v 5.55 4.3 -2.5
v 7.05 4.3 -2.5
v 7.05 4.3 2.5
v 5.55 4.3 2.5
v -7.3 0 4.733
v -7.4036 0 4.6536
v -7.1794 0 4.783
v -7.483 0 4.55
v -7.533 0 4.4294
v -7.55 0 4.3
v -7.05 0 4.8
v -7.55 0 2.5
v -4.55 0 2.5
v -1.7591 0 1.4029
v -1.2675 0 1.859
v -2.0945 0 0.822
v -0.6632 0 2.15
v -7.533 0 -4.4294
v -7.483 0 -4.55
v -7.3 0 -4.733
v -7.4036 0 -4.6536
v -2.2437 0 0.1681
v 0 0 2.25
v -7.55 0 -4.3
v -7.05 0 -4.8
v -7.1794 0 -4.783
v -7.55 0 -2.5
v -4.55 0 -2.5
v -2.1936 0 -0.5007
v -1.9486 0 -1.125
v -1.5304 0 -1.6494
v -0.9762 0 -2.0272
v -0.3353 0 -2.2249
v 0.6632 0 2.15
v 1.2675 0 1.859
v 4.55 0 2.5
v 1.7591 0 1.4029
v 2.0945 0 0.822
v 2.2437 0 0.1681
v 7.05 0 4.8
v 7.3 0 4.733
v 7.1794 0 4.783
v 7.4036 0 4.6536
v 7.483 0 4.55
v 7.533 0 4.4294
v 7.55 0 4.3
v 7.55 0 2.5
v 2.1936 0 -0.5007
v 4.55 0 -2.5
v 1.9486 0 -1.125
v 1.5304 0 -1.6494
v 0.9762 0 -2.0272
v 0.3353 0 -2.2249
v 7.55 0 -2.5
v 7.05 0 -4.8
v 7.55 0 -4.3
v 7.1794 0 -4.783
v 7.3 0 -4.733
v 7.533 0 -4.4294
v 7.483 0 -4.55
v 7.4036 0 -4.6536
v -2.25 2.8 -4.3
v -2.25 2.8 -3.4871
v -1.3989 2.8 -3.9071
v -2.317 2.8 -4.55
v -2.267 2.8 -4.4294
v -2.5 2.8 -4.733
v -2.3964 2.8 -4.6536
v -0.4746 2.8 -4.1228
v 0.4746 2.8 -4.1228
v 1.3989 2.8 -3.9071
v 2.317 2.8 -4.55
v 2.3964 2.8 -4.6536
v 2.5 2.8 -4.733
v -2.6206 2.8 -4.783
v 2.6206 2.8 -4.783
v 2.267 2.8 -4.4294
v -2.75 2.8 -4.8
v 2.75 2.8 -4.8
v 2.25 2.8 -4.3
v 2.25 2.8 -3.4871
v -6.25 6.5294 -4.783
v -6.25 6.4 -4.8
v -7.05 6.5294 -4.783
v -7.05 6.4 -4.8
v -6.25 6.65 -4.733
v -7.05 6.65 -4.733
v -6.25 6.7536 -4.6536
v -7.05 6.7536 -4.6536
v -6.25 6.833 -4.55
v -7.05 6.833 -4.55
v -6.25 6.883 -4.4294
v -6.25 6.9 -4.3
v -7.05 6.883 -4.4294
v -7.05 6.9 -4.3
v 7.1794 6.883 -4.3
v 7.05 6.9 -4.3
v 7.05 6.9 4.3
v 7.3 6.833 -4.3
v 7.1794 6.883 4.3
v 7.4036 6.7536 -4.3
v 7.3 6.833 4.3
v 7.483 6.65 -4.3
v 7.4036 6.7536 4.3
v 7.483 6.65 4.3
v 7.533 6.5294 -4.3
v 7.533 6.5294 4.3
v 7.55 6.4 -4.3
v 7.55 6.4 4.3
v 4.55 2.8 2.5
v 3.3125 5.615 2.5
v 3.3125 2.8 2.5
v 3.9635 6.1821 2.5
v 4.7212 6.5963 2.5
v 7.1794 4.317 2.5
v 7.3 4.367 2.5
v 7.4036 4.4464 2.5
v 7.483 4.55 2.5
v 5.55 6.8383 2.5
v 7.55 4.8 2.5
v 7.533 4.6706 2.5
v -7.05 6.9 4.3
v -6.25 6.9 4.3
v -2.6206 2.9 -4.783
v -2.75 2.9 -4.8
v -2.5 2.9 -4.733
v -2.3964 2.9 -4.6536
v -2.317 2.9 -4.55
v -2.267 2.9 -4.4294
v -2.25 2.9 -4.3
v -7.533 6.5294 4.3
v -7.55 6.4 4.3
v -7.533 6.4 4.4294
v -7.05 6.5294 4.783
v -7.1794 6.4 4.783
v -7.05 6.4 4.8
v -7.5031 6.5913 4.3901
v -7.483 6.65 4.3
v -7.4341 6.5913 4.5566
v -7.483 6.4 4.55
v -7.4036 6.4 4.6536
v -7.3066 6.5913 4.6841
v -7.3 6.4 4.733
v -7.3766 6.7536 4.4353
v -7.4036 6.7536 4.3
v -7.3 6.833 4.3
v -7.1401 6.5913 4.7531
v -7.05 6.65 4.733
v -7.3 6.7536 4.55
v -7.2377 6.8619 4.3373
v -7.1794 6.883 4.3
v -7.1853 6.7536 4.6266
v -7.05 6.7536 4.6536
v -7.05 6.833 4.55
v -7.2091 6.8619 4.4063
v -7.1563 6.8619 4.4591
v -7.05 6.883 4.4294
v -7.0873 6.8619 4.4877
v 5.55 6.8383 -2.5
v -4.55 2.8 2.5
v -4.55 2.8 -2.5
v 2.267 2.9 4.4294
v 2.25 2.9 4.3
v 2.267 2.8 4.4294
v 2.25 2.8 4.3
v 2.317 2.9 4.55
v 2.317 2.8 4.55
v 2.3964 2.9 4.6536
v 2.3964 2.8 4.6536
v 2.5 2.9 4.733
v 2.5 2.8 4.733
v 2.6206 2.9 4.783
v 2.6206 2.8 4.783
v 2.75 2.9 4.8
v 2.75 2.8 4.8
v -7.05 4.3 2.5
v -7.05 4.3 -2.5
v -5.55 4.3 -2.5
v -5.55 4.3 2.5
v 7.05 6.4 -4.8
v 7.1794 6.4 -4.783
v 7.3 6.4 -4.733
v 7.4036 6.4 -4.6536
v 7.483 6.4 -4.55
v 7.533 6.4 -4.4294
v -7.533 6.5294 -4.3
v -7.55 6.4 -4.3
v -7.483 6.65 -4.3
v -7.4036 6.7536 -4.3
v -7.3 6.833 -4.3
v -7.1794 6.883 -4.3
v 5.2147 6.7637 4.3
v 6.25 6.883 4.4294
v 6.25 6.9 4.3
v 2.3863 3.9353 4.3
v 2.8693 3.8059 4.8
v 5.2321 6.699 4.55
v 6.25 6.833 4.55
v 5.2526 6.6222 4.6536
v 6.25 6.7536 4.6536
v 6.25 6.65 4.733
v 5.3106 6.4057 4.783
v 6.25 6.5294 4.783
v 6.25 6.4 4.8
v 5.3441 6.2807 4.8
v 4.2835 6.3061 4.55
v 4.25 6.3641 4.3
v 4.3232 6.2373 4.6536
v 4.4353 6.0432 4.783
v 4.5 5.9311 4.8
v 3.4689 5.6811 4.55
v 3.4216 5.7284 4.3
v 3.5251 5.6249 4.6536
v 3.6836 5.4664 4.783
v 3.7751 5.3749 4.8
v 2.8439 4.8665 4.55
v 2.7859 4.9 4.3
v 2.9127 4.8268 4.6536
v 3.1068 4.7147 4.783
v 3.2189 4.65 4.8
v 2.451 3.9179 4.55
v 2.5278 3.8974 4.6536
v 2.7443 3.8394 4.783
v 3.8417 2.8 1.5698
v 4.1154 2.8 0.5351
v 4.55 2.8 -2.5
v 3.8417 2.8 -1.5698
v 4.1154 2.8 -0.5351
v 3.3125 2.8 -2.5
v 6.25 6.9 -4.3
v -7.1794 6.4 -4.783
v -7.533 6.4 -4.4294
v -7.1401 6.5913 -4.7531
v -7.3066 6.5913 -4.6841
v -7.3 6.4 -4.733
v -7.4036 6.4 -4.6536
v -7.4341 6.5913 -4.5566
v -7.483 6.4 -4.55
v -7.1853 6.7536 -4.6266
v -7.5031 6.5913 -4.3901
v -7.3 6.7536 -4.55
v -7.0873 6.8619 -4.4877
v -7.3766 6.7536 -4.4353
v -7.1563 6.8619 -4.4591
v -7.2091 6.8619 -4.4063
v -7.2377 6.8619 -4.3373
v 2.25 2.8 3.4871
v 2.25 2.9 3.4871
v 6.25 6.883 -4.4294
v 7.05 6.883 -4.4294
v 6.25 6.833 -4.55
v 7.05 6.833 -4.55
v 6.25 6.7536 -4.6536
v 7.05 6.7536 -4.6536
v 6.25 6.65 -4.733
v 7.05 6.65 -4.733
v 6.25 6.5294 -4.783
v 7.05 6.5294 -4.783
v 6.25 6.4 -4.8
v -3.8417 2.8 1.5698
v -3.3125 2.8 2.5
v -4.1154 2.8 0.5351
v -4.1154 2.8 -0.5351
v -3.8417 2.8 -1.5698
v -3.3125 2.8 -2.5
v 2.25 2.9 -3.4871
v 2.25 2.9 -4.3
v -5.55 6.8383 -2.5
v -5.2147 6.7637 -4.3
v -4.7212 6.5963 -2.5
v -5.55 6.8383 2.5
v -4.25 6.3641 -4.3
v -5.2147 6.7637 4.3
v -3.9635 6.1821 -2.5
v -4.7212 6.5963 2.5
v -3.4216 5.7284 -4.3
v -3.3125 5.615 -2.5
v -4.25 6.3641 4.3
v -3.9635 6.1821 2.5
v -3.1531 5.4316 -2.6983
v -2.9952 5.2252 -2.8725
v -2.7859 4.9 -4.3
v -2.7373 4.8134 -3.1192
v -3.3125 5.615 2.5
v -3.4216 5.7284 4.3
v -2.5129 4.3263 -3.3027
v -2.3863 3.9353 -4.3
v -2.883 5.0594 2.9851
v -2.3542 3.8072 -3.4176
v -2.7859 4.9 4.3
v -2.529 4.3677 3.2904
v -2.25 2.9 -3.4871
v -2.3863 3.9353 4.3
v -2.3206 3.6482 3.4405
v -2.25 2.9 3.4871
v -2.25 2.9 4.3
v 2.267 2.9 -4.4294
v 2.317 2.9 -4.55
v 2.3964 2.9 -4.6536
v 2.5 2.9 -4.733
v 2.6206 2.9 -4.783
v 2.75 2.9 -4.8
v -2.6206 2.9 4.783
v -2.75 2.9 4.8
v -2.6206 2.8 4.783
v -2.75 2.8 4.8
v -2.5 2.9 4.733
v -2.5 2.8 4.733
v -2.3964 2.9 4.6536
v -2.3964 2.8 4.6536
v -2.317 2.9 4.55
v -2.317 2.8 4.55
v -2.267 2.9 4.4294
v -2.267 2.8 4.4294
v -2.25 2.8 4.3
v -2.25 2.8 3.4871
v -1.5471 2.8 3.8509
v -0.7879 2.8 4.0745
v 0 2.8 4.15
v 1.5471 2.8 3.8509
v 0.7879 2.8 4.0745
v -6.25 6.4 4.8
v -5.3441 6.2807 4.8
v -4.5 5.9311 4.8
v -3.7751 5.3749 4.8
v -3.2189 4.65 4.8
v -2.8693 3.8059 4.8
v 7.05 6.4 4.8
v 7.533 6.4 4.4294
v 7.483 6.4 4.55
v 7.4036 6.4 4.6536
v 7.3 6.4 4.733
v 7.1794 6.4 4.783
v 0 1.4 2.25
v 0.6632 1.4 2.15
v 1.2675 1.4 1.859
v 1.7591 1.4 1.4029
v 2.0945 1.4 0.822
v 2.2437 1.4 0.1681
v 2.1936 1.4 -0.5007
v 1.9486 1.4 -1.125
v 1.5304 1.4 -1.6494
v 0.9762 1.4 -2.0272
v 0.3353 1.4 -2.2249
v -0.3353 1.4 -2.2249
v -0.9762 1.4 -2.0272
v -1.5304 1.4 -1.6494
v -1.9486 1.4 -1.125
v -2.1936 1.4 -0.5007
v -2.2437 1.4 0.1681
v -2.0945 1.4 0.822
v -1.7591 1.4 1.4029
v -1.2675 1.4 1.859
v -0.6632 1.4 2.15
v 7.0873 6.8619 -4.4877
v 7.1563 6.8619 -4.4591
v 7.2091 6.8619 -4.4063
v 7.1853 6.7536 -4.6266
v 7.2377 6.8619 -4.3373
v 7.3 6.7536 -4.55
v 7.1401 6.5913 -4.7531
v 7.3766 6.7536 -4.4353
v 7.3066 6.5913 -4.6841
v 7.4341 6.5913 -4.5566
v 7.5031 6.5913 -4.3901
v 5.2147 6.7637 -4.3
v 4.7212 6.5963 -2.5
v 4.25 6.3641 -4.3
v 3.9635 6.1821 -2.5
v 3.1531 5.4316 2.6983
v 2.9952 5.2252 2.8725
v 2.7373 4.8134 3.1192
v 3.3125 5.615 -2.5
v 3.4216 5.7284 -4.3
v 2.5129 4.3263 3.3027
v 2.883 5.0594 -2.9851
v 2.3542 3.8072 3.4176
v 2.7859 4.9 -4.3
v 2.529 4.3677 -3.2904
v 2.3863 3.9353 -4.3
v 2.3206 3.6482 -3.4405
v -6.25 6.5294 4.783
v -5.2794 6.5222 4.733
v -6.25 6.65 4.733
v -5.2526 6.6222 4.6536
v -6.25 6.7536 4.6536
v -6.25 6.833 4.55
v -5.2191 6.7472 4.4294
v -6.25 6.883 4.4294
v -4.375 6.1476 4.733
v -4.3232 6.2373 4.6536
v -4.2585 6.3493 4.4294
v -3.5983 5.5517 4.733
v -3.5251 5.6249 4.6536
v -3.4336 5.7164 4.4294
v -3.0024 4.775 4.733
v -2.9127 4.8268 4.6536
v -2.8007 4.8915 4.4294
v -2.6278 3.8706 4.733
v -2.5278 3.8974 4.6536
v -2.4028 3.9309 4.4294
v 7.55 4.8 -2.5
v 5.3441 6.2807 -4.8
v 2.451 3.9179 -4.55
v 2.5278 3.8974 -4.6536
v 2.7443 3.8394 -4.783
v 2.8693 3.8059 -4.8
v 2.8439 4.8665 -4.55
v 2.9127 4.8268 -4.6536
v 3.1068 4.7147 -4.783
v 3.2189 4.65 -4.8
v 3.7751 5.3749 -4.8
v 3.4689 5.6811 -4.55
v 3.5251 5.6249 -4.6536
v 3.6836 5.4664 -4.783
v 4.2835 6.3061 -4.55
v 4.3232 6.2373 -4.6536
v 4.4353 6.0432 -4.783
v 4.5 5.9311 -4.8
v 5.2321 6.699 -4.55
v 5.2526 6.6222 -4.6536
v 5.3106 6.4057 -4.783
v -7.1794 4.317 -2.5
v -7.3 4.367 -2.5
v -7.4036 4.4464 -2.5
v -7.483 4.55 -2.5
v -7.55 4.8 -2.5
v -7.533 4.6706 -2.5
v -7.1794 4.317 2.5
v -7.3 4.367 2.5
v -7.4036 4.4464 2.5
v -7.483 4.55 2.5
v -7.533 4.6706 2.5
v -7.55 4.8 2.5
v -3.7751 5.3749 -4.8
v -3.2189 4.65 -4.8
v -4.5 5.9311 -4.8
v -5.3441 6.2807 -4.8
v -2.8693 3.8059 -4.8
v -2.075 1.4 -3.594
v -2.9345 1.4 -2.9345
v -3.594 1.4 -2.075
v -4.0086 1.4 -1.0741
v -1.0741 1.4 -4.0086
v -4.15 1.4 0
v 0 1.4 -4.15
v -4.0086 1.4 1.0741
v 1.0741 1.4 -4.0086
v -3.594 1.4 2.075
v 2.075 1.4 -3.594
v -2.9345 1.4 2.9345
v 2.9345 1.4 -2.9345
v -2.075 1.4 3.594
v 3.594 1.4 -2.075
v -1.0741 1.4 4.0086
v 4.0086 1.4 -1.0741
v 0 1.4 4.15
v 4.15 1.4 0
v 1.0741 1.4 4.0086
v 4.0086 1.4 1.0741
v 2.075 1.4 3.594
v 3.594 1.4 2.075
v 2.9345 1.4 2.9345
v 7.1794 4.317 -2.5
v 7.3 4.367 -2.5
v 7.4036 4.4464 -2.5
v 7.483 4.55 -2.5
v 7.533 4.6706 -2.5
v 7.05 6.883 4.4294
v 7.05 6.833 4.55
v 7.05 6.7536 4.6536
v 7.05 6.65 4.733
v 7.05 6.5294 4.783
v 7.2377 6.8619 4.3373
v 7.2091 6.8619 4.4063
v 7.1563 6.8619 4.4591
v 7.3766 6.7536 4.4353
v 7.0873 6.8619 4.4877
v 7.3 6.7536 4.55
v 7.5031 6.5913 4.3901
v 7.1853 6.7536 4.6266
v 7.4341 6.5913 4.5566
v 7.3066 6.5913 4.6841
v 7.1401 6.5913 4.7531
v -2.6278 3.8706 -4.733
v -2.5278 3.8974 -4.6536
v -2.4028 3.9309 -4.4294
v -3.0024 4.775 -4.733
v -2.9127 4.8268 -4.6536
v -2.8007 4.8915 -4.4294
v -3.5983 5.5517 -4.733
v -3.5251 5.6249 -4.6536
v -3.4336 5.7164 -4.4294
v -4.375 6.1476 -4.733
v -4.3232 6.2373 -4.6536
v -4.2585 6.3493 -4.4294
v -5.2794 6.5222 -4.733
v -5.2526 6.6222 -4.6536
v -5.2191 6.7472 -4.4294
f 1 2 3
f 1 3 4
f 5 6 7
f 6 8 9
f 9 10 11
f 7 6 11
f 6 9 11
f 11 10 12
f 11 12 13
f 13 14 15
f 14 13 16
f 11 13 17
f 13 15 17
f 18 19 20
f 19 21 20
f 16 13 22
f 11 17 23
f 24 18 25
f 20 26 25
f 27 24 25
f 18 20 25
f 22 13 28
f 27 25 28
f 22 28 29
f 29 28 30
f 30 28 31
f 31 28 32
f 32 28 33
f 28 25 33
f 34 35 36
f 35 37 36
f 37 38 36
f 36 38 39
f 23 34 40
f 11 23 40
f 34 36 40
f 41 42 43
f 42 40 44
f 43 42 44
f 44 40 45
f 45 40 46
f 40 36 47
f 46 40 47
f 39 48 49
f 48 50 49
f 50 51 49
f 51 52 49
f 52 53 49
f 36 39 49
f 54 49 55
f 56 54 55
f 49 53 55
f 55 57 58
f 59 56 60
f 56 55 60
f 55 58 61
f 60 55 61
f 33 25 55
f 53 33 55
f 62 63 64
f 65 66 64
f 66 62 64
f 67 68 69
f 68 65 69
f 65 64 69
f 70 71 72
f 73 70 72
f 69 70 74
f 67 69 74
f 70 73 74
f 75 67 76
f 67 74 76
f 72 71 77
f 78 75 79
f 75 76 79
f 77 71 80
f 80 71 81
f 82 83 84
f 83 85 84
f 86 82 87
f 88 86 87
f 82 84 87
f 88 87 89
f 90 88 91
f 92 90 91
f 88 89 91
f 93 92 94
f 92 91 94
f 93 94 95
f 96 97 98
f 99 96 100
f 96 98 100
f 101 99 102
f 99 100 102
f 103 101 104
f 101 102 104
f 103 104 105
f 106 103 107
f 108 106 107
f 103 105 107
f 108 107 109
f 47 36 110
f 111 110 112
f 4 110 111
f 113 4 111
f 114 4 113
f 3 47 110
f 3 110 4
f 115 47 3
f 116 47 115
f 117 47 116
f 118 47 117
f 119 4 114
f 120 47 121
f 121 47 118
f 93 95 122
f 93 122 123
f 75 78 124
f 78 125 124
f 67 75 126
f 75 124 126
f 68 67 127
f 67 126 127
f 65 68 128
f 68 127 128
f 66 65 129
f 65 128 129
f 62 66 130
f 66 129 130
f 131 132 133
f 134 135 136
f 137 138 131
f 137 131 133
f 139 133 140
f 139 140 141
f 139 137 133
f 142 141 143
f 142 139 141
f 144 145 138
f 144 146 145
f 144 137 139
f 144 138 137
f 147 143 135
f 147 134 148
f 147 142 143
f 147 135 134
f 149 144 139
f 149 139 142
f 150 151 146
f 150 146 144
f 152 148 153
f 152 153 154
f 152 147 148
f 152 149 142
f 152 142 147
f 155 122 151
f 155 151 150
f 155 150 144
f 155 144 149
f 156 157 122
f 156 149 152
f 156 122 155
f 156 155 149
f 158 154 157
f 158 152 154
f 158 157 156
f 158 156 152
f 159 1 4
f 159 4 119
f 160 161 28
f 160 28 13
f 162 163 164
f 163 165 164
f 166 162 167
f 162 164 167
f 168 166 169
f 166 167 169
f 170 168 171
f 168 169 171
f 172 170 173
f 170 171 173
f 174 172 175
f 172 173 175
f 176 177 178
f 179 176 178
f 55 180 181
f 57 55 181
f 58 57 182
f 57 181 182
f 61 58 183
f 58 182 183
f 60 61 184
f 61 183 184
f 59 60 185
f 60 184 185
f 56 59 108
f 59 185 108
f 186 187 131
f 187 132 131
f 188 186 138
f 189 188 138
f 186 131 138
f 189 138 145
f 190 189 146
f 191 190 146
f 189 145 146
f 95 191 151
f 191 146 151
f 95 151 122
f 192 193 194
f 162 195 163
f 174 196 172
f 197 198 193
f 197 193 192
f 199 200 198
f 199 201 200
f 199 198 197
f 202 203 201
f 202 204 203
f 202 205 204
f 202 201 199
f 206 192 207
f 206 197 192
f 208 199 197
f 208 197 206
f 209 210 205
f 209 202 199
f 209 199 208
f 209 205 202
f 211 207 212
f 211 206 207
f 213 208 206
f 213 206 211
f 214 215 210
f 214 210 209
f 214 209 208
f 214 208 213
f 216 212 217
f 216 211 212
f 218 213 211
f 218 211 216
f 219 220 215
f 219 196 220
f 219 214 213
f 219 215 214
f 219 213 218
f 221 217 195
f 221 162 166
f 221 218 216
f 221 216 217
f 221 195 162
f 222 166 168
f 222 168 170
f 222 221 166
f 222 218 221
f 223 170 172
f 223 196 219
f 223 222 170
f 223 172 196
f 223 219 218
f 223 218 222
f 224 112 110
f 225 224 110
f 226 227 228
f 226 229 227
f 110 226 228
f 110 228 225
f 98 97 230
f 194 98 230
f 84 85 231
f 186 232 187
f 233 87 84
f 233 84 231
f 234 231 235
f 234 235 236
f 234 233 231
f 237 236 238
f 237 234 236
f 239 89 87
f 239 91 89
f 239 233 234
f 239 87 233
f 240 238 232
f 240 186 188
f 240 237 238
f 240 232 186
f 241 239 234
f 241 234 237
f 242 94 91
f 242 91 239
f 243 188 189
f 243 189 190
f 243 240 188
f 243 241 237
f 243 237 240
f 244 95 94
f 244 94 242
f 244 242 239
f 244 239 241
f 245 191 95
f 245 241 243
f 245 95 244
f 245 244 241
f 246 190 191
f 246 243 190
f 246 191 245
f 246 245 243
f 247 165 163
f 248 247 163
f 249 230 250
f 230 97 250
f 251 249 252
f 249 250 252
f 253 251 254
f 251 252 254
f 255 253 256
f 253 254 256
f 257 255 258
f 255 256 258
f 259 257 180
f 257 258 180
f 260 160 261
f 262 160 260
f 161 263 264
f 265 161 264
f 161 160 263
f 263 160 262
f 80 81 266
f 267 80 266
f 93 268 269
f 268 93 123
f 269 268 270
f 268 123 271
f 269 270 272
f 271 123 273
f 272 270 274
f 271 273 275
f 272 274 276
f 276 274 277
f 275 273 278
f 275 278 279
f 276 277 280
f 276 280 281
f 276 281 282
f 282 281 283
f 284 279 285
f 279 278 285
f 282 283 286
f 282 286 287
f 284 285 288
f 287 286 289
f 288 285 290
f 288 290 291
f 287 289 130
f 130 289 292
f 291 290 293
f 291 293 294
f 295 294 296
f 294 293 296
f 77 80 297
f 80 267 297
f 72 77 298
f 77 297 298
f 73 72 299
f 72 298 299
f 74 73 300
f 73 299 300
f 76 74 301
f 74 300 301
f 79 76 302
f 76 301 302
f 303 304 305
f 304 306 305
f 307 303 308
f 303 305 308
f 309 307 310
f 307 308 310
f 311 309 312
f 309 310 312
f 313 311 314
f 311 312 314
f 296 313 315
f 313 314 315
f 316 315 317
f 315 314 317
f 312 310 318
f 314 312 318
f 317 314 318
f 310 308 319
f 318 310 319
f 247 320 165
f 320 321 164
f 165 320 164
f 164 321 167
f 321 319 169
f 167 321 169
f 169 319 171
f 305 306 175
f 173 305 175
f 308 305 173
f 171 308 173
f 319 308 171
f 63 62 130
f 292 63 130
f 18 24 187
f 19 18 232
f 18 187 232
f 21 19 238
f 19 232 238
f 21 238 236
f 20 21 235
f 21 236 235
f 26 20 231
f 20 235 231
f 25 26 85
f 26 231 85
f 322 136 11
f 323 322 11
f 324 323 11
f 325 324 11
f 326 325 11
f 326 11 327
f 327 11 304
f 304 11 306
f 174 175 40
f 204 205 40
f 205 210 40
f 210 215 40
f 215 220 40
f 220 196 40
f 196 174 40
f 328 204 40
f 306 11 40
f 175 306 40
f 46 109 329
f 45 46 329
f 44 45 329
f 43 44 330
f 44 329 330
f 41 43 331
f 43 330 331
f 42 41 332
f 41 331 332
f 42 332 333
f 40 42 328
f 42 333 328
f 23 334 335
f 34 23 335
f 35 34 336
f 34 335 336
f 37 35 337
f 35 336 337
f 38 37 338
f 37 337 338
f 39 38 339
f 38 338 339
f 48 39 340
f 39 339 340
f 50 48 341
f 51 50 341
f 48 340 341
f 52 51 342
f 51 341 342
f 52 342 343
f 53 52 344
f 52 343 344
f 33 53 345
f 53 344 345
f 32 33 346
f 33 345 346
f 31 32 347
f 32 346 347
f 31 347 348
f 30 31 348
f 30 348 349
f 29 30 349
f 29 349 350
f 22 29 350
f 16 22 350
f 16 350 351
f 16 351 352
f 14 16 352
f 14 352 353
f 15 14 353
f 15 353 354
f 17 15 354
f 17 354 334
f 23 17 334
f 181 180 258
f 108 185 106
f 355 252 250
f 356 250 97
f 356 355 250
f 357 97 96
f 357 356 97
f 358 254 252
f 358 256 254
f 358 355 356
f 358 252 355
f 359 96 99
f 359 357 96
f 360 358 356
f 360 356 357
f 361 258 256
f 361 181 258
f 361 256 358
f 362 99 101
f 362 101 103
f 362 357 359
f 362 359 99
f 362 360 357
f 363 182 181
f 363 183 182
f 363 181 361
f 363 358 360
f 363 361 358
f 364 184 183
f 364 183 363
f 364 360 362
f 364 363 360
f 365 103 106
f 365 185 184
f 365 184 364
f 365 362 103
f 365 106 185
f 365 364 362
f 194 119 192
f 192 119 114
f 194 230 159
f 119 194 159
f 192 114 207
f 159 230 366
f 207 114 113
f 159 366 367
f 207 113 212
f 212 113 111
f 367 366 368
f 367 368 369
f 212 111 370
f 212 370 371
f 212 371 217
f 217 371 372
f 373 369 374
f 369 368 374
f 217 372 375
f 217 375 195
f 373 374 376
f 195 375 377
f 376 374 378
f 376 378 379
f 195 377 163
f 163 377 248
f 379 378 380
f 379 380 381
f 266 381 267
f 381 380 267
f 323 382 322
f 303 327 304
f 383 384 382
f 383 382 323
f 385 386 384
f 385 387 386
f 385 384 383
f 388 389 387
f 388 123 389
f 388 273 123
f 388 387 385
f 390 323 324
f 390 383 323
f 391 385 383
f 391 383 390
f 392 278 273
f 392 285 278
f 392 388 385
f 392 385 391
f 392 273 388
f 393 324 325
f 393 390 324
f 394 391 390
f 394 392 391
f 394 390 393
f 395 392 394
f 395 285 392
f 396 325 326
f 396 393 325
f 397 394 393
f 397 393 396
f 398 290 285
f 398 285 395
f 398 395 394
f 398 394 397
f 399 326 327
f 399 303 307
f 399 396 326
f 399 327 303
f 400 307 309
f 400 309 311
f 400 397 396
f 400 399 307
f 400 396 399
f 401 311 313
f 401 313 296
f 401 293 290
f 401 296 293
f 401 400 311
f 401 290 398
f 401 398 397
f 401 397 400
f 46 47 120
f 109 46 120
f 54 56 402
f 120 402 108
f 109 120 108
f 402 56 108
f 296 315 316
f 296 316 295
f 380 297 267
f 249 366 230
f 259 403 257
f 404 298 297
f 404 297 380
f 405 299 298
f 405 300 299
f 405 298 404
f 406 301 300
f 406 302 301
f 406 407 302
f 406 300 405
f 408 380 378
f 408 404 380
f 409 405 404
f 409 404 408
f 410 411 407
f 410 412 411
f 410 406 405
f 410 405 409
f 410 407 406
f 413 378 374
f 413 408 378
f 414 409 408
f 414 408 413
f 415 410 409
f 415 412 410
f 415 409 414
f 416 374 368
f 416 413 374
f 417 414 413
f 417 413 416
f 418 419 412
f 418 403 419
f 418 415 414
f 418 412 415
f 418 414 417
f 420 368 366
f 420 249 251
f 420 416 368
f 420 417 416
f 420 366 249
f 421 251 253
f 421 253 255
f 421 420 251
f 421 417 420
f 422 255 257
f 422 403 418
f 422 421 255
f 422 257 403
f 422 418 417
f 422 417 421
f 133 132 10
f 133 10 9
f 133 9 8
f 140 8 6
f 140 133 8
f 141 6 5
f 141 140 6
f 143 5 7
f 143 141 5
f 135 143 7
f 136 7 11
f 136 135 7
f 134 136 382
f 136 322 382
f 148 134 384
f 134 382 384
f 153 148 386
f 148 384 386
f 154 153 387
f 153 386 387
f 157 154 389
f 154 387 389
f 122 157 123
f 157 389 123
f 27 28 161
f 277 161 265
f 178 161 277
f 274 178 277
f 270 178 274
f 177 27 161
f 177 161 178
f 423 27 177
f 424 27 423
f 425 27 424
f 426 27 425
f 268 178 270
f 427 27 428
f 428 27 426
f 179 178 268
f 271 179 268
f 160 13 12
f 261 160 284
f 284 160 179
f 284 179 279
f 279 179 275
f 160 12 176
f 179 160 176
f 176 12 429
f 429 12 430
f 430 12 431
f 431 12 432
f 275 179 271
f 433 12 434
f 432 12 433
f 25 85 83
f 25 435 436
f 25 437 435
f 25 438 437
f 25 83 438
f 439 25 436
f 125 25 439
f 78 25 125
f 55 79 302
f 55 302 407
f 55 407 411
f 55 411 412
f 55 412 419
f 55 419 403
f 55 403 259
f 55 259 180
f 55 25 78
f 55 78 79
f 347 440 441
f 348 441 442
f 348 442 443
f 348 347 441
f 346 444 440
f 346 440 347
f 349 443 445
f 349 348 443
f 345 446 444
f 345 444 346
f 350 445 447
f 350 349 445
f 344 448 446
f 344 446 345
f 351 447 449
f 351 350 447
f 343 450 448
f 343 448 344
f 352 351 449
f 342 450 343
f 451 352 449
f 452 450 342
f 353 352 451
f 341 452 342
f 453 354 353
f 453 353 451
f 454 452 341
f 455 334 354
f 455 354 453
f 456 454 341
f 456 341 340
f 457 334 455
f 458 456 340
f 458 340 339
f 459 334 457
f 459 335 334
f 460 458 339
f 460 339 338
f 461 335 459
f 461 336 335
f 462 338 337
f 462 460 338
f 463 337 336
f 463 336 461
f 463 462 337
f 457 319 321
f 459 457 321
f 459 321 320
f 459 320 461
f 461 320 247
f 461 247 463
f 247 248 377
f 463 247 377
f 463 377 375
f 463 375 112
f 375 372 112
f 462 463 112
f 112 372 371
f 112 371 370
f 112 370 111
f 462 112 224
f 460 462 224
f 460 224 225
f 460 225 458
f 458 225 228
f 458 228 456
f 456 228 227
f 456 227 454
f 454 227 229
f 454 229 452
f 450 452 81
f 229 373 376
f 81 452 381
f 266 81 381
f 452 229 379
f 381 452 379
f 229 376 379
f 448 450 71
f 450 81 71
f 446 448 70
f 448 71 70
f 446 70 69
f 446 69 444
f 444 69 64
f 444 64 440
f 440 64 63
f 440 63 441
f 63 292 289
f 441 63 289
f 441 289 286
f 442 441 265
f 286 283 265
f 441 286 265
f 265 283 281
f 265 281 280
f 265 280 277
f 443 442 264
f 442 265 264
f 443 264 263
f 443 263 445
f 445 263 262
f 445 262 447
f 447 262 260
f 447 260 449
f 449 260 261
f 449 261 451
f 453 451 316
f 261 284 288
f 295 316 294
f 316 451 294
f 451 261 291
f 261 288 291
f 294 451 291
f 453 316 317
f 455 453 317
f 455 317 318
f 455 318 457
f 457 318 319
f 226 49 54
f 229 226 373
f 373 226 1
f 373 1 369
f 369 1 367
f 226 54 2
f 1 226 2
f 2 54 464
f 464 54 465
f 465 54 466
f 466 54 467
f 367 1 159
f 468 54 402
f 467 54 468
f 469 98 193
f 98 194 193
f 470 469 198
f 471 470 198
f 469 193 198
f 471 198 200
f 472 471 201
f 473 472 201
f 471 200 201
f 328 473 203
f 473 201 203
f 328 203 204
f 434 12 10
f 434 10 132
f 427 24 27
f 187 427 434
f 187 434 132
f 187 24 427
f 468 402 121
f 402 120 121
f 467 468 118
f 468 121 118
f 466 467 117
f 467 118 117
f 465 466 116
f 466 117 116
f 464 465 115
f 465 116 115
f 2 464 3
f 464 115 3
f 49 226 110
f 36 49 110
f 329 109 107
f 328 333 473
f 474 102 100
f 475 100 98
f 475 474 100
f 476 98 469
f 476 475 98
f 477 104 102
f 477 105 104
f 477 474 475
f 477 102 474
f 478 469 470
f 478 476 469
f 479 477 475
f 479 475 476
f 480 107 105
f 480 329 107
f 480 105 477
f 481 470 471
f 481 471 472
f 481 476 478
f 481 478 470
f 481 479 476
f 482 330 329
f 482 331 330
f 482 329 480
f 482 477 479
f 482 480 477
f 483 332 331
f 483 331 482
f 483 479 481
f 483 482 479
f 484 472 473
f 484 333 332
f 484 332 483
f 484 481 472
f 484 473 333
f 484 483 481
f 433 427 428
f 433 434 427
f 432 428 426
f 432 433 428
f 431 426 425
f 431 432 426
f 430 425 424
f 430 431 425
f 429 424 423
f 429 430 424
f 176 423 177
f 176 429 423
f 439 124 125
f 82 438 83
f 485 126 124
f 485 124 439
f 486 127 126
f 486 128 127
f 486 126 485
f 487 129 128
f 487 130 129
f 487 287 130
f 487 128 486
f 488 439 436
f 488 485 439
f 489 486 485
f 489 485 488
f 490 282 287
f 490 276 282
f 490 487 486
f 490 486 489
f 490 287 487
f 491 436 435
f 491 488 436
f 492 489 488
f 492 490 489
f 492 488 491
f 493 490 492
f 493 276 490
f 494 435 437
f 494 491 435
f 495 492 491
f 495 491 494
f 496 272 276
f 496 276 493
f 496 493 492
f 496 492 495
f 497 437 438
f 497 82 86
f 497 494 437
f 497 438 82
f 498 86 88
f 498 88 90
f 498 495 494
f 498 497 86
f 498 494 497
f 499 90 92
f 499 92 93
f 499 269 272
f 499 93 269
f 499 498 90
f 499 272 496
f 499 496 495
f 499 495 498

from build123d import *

# Parameters (mm, degrees)
SKETCH1_W           = 15.1
SKETCH1_H           = 9.6
BOSS_EXTRUDE1_DEPTH = 6.9
SKETCH3_R           = 2.25
CUT_EXTRUDE1_DEPTH  = 12.298340586
SKETCH4_R           = 4.15
CUT_EXTRUDE2_DEPTH  = 5.5
SKETCH5_W           = 15.1
SKETCH5_H           = 5
CUT_EXTRUDE3_DEPTH  = 4.1
SKETCH6_W           = 4.5
SKETCH6_H           = 4.1
CUT_EXTRUDE4_DEPTH  = 11.4
SKETCH9_W           = 5
SKETCH9_H           = 2.8
CUT_EXTRUDE5_DEPTH  = 3
FILLET3_R           = 0.5
BOSS_EXTRUDE2_REACH = 14.566
SKETCH10_W          = 2
SKETCH10_H          = 2.6
FILLET4_R           = 4
FILLET5_R           = 0.5
FILLET6_R           = 0.5


with BuildPart() as part:
    # Sketch1 → Boss-Extrude1 (new body)
    with BuildSketch(Plane(origin=(0, 0, 0), x_dir=(1, 0, 0), z_dir=(0, 1, 0))):
        Rectangle(SKETCH1_W, SKETCH1_H)
    extrude(amount=BOSS_EXTRUDE1_DEPTH)

    # Sketch3 → Cut-Extrude1 (cut, through all)
    with BuildSketch(Plane(origin=(0, 6.9, 0), x_dir=(1, 0, 0), z_dir=(0, 1, 0))):
        with Locations(Location((0, 0, 0), (0, 0, 270))):
            Circle(SKETCH3_R)
    extrude(amount=-CUT_EXTRUDE1_DEPTH, mode=Mode.SUBTRACT)

    # Sketch4 → Cut-Extrude2 (cut)
    with BuildSketch(Plane(origin=(0, 6.9, 0), x_dir=(1, 0, 0), z_dir=(0, 1, 0))):
        with Locations(Location((0, 0, 0), (0, 0, 270))):
            Circle(SKETCH4_R)
    extrude(amount=-CUT_EXTRUDE2_DEPTH, mode=Mode.SUBTRACT)

    # Sketch5 → Cut-Extrude3 (cut)
    with BuildSketch(Plane(origin=(0, 6.9, 0), x_dir=(1, 0, 0), z_dir=(0, 1, 0))):
        Rectangle(SKETCH5_W, SKETCH5_H)
    extrude(amount=-CUT_EXTRUDE3_DEPTH, mode=Mode.SUBTRACT)

    # Sketch6 → Cut-Extrude4 (cut, symmetric)
    with BuildSketch(Plane.XY):
        with Locations((0, 4.85)):
            Rectangle(SKETCH6_W, SKETCH6_H)
    extrude(amount=CUT_EXTRUDE4_DEPTH, both=True, mode=Mode.SUBTRACT)

    # Sketch9 → Cut-Extrude5 (cut)
    with BuildSketch(Plane.ZY.offset(7.55)):
        with Locations((0, 1.4)):
            Rectangle(SKETCH9_W, SKETCH9_H)
    cut_extrude5 = extrude(amount=-CUT_EXTRUDE5_DEPTH, mode=Mode.SUBTRACT)

    # Fillet3
    fillet3_edges = [part.edges().sort_by_distance(p)[0] for p in [
        (7.55, 3.45, 4.8),
        (-7.55, 3.45, 4.8),
        (-7.55, 3.45, -4.8),
        (7.55, 3.45, -4.8),
    ]]
    fillet(fillet3_edges, radius=FILLET3_R)

    # Sketch10 → Boss-Extrude2 (add, up to next)
    with BuildSketch(Plane.XY.offset(-2.5), mode=Mode.PRIVATE) as boss_extrude2_sk1:
        with Locations((-6.55, 5.6)):
            Rectangle(SKETCH10_W, SKETCH10_H)
    boss_extrude2_tool1 = extrude(boss_extrude2_sk1.sketch, amount=BOSS_EXTRUDE2_REACH, mode=Mode.PRIVATE) - part.part
    boss_extrude2 = boss_extrude2_tool1.solids().sort_by_distance((-6.55, 5.6, -2.5))[0]
    add(boss_extrude2)

    # Mirror1: Cut-Extrude5, Boss-Extrude2 across plane
    add(cut_extrude5.mirror(Plane(origin=(0, 0, 0), x_dir=(0, 0, 1), z_dir=(1, 0, 0))), mode=Mode.SUBTRACT)
    add(boss_extrude2.mirror(Plane(origin=(0, 0, 0), x_dir=(0, 0, 1), z_dir=(1, 0, 0))))

    # Fillet4
    # the kernel refuses this fillet: 4 mm, written as the material it takes off along each edge
    with BuildSketch(Plane(origin=(2.25, 6.9, -14.8), x_dir=(0, -1, 0), z_dir=(0, 0, 1)), Plane(origin=(-2.25, 6.9, 6.512880845), x_dir=(0, -1, 0), z_dir=(0, 0, -1))) as fillet4_piece_1:
        with BuildLine():
            CenterArc((FILLET4_R, FILLET4_R), FILLET4_R, 180, 90)
            Line((0, FILLET4_R), (0, 0))
            Line((0, 0), (FILLET4_R, 0))
        make_face()
    extrude(amount=21.312880845, mode=Mode.SUBTRACT)

    # Fillet5
    fillet5_edges = [part.edges().sort_by_distance(p)[0] for p in [
        (6.65, 6.9, -4.8),
        (7.403553391, 6.9, -4.653553391),
        (-6.65, 6.9, 4.8),
        (7.403553391, 6.9, 4.653553391),
        (-7.403553391, 6.9, 4.653553391),
        (-7.403553391, 6.9, -4.653553391),
        (6.65, 6.9, 4.8),
        (2.25, 2.85, 4.8),
        (3.421572875, 5.728427125, 4.8),
        (-3.421572875, 5.728427125, 4.8),
        (-6.65, 6.9, -4.8),
        (-2.25, 2.85, -4.8),
        (-3.421572875, 5.728427125, -4.8),
        (3.421572875, 5.728427125, -4.8),
        (7.55, 6.9, 0),
        (-7.55, 6.9, 0),
        (-2.25, 2.85, 4.8),
        (2.25, 2.85, -4.8),
    ]]
    fillet(fillet5_edges, radius=FILLET5_R)

    # Fillet6
    fillet6_edges = [part.edges().sort_by_distance(p)[0] for p in [
        (-7.55, 4.3, 0),
        (7.55, 4.3, 0),
    ]]
    fillet(fillet6_edges, radius=FILLET6_R)


solid = part.part
